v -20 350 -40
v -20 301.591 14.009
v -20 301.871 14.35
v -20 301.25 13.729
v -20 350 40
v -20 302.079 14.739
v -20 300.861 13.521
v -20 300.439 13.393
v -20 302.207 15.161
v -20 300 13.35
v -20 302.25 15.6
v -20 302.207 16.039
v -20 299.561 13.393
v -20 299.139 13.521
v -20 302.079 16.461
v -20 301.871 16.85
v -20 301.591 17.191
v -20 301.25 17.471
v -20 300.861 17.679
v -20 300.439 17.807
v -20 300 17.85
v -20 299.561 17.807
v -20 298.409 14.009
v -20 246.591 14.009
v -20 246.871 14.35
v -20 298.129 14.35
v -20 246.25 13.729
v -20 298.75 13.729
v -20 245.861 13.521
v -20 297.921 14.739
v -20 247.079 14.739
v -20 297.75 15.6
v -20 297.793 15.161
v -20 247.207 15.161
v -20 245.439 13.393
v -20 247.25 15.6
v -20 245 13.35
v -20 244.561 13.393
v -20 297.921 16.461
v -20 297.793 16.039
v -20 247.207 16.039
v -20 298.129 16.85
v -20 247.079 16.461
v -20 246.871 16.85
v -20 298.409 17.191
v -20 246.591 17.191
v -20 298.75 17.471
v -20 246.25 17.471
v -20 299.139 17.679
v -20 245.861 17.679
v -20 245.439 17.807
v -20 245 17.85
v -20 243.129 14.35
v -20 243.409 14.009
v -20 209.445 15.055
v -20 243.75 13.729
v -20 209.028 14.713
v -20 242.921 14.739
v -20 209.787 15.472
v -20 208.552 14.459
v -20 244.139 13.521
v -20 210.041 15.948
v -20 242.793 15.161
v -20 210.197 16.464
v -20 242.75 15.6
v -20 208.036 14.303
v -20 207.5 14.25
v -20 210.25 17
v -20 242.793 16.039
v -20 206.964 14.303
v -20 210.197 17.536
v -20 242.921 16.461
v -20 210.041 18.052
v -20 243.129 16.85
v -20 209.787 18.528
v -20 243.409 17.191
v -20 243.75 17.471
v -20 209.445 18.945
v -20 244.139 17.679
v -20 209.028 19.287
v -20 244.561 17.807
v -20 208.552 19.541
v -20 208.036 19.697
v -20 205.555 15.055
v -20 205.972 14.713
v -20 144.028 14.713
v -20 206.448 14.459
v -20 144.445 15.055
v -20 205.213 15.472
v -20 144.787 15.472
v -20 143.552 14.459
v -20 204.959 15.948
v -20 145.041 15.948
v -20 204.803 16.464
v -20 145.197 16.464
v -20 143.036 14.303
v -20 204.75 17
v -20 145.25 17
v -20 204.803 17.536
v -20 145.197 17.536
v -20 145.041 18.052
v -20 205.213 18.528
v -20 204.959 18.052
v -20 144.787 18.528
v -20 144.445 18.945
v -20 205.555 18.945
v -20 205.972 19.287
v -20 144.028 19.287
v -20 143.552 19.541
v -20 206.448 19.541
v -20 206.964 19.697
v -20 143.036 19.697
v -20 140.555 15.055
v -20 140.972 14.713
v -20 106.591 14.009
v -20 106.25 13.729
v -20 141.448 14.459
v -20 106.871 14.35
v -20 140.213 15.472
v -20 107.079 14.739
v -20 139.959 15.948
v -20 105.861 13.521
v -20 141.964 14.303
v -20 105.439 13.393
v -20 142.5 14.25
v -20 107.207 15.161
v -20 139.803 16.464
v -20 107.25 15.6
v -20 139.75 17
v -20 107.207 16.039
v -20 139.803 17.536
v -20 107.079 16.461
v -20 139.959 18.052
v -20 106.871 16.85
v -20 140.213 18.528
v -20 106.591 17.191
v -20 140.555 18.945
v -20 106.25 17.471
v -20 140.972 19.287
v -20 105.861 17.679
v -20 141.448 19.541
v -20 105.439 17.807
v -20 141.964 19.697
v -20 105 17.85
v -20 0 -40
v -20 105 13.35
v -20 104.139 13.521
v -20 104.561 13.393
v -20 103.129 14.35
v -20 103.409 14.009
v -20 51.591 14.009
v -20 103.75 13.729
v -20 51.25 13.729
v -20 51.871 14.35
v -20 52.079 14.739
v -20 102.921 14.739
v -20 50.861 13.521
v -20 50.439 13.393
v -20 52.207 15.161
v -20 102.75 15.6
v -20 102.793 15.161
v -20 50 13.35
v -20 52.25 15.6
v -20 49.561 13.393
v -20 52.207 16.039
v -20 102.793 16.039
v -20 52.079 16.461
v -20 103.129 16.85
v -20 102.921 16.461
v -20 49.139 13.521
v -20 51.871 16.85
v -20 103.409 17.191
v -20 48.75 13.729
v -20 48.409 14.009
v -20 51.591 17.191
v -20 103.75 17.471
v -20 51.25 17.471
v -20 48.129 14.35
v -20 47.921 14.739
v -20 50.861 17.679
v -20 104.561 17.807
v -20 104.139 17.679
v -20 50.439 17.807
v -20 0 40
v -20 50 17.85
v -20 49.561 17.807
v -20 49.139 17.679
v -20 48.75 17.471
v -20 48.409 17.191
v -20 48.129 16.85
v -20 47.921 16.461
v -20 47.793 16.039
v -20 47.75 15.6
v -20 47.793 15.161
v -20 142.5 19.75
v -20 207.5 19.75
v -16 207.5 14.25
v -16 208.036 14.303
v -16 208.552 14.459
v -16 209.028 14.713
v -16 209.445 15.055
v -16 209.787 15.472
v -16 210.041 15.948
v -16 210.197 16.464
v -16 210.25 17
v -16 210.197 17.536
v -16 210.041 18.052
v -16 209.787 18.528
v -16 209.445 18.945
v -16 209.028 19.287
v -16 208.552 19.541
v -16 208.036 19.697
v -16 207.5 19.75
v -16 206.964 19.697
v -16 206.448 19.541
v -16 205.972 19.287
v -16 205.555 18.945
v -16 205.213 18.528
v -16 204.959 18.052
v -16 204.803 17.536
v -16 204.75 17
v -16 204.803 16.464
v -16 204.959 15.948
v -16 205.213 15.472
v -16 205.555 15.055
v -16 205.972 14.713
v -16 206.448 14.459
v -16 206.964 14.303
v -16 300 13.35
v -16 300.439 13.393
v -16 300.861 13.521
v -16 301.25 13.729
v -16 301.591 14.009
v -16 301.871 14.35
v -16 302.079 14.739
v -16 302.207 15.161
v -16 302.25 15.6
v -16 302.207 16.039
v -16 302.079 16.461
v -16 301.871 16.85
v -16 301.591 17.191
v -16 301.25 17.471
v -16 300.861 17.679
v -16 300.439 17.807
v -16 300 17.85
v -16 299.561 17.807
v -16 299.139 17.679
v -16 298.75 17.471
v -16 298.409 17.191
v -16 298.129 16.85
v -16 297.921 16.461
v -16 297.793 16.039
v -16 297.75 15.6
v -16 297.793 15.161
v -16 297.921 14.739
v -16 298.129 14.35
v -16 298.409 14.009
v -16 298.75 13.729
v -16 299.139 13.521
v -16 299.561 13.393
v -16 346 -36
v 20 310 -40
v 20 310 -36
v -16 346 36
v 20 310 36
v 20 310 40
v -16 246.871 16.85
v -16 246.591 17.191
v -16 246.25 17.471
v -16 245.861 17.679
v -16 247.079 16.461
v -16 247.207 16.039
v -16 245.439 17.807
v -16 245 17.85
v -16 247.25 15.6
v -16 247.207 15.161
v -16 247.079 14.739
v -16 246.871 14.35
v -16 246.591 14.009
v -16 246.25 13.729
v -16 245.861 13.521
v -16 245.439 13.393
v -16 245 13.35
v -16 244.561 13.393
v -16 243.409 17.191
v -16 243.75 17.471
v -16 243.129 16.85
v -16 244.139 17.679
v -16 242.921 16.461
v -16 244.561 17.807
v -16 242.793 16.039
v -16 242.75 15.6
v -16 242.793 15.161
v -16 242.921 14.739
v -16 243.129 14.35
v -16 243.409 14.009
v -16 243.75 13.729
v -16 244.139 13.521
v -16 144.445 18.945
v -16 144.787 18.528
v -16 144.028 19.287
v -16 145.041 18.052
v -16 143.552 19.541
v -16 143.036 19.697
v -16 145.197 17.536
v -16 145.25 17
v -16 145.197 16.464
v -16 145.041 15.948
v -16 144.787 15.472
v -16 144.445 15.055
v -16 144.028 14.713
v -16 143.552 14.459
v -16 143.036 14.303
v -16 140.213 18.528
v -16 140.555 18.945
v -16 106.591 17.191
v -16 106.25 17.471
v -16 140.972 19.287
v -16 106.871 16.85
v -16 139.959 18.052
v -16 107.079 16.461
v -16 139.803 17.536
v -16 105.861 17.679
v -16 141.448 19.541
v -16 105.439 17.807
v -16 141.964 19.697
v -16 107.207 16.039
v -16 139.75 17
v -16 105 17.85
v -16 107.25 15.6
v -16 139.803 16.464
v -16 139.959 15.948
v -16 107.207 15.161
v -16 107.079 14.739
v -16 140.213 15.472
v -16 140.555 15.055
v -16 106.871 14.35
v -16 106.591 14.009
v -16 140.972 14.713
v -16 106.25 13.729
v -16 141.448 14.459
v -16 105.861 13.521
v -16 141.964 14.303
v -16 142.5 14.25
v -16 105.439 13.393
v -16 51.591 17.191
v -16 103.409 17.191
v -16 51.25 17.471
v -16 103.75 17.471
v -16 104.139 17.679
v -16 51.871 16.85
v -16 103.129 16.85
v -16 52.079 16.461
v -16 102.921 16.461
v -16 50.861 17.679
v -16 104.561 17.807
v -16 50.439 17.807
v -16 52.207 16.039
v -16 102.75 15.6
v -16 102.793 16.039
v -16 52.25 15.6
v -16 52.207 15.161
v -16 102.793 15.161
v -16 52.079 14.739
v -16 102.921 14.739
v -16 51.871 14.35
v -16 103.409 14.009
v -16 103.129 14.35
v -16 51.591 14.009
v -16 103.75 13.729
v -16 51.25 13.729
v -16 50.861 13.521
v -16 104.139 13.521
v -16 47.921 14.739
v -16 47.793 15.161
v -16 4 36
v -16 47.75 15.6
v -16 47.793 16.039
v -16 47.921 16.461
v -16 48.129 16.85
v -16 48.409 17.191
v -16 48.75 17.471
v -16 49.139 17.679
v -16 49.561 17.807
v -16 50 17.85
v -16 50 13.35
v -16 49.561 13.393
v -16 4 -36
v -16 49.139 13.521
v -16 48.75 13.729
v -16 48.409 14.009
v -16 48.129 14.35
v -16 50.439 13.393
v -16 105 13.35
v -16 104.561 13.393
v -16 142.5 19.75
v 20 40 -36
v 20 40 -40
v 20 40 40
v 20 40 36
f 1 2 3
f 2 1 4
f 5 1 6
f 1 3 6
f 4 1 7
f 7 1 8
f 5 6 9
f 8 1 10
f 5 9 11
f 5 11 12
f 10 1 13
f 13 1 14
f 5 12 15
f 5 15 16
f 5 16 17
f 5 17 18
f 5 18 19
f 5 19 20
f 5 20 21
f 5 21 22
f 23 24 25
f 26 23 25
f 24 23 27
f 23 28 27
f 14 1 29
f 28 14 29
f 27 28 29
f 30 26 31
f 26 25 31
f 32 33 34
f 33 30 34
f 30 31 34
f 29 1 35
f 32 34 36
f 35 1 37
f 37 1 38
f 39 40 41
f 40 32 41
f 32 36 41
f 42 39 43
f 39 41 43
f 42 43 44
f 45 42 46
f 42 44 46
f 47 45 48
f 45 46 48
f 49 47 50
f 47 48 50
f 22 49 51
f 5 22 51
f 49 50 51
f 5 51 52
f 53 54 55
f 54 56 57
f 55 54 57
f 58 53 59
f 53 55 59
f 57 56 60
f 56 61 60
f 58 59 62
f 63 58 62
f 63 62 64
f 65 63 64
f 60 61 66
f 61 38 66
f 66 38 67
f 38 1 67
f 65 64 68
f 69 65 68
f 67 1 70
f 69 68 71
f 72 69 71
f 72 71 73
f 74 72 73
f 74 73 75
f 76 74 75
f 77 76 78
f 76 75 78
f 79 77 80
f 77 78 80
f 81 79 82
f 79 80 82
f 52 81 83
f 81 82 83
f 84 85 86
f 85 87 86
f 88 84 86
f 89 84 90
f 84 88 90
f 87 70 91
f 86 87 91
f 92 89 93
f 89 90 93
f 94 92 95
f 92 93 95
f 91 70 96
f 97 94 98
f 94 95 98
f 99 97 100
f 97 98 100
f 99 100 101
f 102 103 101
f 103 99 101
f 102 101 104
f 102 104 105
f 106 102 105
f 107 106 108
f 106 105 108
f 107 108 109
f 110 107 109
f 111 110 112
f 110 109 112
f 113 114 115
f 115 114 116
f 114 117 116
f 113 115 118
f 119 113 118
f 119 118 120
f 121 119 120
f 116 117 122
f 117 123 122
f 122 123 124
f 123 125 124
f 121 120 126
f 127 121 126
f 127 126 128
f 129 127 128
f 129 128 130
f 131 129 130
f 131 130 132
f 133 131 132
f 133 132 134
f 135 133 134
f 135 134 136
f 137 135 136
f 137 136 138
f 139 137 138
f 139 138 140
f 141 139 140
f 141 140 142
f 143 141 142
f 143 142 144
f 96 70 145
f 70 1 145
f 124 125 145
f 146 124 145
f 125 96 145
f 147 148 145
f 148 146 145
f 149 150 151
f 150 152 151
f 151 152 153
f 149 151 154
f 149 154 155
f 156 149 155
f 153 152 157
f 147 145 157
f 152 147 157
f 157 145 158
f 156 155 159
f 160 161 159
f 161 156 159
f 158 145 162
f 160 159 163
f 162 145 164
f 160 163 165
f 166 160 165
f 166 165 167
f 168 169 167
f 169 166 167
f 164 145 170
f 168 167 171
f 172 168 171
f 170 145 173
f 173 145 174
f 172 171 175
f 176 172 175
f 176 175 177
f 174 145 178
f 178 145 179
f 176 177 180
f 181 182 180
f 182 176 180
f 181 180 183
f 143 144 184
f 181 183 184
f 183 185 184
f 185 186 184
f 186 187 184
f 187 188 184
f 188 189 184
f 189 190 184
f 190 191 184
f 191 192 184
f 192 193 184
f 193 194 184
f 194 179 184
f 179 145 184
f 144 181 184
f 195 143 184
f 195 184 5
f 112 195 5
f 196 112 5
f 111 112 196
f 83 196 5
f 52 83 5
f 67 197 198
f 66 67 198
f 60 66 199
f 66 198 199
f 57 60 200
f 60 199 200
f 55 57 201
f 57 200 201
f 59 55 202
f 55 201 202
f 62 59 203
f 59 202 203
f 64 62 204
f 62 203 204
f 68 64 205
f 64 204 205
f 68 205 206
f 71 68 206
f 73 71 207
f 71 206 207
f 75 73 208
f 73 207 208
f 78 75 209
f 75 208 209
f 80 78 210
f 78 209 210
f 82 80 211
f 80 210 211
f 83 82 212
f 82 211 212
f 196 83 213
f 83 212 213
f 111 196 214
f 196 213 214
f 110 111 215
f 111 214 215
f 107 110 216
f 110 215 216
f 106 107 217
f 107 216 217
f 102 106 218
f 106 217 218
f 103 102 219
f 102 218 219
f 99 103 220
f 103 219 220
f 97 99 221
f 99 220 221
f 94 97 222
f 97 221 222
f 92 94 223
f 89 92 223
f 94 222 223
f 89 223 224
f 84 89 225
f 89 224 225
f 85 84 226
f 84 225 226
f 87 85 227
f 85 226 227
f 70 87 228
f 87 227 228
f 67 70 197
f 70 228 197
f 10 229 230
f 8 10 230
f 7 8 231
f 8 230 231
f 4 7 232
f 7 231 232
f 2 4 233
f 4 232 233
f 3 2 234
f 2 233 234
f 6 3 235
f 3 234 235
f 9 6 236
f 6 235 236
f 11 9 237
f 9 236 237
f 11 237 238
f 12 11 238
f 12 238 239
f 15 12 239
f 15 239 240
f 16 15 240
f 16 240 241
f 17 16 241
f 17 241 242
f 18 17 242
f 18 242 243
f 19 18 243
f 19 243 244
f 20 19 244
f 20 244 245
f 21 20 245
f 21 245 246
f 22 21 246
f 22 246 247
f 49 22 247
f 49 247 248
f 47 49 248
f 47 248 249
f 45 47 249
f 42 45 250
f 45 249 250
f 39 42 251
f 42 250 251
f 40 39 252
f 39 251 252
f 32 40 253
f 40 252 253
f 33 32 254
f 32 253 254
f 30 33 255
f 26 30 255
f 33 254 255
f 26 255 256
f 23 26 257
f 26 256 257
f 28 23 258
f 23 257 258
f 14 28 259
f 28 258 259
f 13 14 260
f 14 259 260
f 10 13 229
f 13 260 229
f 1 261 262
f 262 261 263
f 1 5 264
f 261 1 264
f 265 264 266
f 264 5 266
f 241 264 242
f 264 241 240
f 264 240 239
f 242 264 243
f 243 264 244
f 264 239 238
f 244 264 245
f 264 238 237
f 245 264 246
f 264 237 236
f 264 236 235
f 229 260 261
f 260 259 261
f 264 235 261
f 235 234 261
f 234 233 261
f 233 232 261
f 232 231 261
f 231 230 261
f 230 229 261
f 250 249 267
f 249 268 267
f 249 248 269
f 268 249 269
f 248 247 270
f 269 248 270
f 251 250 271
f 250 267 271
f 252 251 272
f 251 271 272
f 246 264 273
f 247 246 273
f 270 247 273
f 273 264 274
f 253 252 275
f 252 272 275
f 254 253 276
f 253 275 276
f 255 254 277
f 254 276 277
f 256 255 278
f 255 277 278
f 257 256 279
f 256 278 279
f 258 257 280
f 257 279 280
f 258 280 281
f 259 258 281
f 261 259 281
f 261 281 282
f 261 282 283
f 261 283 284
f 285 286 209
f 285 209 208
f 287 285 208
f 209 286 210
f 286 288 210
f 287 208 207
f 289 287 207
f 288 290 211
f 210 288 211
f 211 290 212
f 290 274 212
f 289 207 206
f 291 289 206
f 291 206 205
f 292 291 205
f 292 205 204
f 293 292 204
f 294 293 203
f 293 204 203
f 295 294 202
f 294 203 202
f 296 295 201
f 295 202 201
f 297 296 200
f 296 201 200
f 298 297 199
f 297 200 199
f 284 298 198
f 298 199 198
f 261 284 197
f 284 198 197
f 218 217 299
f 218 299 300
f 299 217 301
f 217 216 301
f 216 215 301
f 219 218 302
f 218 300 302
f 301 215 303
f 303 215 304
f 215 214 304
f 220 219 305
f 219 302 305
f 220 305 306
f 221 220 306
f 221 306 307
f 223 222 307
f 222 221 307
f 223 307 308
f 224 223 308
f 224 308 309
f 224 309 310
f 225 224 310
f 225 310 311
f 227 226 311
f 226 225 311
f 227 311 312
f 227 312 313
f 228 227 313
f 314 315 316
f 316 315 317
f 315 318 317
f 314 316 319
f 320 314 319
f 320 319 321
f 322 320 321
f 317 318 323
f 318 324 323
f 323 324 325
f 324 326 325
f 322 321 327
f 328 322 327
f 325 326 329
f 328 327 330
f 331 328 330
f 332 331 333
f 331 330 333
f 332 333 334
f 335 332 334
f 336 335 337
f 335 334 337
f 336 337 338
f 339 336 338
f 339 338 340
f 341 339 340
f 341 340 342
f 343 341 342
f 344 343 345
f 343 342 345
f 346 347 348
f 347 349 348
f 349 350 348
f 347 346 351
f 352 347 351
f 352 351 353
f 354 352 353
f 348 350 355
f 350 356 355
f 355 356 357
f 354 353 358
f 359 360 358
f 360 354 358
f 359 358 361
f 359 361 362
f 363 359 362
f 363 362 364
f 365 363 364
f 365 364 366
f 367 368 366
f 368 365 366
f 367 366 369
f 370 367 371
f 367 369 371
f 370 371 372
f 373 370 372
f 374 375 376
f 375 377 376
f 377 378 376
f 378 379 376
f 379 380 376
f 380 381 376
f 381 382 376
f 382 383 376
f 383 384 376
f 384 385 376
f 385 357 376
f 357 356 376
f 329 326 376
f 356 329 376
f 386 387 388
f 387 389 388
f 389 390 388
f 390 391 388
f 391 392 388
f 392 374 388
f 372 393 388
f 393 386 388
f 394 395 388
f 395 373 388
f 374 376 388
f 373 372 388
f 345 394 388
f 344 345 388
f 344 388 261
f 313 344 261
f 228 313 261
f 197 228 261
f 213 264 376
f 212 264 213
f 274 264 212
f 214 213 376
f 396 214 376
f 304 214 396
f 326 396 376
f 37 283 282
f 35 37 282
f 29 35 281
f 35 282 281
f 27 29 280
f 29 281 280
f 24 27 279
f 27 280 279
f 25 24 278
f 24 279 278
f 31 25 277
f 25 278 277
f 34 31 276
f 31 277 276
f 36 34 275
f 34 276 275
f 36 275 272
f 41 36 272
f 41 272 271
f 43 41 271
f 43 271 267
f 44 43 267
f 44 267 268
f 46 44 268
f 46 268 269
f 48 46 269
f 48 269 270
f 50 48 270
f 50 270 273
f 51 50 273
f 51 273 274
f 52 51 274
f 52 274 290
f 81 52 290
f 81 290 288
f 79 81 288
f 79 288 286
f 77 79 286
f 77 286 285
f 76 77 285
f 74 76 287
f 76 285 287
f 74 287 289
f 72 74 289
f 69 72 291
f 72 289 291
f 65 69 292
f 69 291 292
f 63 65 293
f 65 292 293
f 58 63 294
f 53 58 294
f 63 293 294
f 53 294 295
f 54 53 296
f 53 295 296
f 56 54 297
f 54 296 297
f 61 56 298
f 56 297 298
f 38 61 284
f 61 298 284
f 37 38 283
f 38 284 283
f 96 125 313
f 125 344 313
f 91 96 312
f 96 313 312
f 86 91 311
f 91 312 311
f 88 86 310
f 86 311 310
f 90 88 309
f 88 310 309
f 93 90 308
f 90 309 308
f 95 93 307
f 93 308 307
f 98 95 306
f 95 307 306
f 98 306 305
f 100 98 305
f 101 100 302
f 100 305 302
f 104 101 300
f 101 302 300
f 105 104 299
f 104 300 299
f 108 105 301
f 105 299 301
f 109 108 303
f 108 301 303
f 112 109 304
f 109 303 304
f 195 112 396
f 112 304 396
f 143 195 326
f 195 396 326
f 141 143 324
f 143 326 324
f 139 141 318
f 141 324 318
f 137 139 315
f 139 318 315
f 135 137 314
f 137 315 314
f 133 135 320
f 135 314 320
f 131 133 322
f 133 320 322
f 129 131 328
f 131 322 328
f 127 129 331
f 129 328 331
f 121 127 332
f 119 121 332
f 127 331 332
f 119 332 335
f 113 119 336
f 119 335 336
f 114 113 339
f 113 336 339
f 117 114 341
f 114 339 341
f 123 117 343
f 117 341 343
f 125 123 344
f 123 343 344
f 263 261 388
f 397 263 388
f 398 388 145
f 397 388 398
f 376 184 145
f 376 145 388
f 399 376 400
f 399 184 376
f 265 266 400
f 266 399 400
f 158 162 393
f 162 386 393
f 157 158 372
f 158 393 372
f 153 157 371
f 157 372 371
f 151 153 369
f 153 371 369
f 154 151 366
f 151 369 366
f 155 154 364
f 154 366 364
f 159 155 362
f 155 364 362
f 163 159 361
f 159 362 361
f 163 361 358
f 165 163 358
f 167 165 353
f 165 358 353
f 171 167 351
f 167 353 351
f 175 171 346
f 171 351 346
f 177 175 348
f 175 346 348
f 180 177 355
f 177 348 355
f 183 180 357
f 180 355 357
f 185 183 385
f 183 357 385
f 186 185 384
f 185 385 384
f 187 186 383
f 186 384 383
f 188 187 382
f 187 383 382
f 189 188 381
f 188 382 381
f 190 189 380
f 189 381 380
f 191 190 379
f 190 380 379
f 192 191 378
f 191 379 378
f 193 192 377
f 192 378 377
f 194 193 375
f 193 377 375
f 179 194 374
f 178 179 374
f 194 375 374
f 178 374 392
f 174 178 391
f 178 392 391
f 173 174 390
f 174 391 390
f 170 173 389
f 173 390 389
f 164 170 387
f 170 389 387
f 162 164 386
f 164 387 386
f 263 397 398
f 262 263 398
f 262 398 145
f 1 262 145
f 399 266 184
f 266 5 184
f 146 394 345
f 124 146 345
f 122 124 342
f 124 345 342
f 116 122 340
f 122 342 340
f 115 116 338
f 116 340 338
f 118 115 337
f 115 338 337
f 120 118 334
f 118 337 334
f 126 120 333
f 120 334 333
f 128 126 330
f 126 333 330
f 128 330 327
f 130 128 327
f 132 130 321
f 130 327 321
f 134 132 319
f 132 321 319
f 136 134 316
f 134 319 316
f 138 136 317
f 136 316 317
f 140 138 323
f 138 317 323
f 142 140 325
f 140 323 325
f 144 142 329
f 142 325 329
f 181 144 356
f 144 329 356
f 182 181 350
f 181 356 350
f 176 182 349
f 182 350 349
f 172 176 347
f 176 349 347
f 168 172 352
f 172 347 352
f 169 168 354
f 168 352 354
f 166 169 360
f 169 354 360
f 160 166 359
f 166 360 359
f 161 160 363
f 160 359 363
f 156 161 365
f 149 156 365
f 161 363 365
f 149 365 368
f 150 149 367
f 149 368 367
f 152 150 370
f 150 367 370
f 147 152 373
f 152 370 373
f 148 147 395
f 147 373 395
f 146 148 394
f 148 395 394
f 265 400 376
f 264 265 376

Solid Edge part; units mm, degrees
sketch "Sketch1" plane through (0, 0, 0) normal (0, -1, 0) x (1, 0, 0)
  line L0 (20, 36) -> (-16, 36)
  line L1 (-16, 36) -> (-16, -36)
  line L2 (-16, -36) -> (20, -36)
  line L3 (20, -36) -> (20, -40)
  line L4 (20, -40) -> (-20, -40)
  line L5 (-20, -40) -> (-20, 40)
  line L6 (-20, 40) -> (20, 40)
  line L7 (20, 40) -> (20, 36)
  dimension "D1" = 80
  dimension "D2" = 40
  dimension "D3" = 4
  dimension "D4" = 4
extrude "Protrusion1" add sketch "Sketch1" against normal blind 350
sketch "Sketch2" plane through (0, 175, 40) normal (0, 0, 1) x (0, 1, 0)
  line L0 (-175, 20) -> (-135, -20)
extrude "Cutout1" cut sketch "Sketch2" against normal through all material side at (0.0354, 19.9646, 40)
sketch "Sketch3" plane through (0, 175, 40) normal (0, 0, 1) x (0, 1, 0)
  line L0 (175, 20) -> (135, -20)
extrude "Cutout2" cut sketch "Sketch3" against normal through all material side at (0.0354, 330.0354, 40)
hole "Bohrung_1" at (-16, 142.5, 17) direction (-1, 0, 0) diameter 5.5 end up to next
hole "Hole1" at (-16, 207.5, 17) direction (-1, 0, 0) diameter 5.5 end up to next
hole "Bohrung_3" at (-16, 50, 15.6) direction (-1, 0, 0) diameter 4.5 end up to next
hole "Hole2" at (-16, 105, 15.6) direction (-1, 0, 0) diameter 4.5 end up to next
hole "Hole3" at (-16, 245, 15.6) direction (-1, 0, 0) diameter 4.5 end up to next
hole "Hole4" at (-16, 300, 15.6) direction (-1, 0, 0) diameter 4.5 end up to next
